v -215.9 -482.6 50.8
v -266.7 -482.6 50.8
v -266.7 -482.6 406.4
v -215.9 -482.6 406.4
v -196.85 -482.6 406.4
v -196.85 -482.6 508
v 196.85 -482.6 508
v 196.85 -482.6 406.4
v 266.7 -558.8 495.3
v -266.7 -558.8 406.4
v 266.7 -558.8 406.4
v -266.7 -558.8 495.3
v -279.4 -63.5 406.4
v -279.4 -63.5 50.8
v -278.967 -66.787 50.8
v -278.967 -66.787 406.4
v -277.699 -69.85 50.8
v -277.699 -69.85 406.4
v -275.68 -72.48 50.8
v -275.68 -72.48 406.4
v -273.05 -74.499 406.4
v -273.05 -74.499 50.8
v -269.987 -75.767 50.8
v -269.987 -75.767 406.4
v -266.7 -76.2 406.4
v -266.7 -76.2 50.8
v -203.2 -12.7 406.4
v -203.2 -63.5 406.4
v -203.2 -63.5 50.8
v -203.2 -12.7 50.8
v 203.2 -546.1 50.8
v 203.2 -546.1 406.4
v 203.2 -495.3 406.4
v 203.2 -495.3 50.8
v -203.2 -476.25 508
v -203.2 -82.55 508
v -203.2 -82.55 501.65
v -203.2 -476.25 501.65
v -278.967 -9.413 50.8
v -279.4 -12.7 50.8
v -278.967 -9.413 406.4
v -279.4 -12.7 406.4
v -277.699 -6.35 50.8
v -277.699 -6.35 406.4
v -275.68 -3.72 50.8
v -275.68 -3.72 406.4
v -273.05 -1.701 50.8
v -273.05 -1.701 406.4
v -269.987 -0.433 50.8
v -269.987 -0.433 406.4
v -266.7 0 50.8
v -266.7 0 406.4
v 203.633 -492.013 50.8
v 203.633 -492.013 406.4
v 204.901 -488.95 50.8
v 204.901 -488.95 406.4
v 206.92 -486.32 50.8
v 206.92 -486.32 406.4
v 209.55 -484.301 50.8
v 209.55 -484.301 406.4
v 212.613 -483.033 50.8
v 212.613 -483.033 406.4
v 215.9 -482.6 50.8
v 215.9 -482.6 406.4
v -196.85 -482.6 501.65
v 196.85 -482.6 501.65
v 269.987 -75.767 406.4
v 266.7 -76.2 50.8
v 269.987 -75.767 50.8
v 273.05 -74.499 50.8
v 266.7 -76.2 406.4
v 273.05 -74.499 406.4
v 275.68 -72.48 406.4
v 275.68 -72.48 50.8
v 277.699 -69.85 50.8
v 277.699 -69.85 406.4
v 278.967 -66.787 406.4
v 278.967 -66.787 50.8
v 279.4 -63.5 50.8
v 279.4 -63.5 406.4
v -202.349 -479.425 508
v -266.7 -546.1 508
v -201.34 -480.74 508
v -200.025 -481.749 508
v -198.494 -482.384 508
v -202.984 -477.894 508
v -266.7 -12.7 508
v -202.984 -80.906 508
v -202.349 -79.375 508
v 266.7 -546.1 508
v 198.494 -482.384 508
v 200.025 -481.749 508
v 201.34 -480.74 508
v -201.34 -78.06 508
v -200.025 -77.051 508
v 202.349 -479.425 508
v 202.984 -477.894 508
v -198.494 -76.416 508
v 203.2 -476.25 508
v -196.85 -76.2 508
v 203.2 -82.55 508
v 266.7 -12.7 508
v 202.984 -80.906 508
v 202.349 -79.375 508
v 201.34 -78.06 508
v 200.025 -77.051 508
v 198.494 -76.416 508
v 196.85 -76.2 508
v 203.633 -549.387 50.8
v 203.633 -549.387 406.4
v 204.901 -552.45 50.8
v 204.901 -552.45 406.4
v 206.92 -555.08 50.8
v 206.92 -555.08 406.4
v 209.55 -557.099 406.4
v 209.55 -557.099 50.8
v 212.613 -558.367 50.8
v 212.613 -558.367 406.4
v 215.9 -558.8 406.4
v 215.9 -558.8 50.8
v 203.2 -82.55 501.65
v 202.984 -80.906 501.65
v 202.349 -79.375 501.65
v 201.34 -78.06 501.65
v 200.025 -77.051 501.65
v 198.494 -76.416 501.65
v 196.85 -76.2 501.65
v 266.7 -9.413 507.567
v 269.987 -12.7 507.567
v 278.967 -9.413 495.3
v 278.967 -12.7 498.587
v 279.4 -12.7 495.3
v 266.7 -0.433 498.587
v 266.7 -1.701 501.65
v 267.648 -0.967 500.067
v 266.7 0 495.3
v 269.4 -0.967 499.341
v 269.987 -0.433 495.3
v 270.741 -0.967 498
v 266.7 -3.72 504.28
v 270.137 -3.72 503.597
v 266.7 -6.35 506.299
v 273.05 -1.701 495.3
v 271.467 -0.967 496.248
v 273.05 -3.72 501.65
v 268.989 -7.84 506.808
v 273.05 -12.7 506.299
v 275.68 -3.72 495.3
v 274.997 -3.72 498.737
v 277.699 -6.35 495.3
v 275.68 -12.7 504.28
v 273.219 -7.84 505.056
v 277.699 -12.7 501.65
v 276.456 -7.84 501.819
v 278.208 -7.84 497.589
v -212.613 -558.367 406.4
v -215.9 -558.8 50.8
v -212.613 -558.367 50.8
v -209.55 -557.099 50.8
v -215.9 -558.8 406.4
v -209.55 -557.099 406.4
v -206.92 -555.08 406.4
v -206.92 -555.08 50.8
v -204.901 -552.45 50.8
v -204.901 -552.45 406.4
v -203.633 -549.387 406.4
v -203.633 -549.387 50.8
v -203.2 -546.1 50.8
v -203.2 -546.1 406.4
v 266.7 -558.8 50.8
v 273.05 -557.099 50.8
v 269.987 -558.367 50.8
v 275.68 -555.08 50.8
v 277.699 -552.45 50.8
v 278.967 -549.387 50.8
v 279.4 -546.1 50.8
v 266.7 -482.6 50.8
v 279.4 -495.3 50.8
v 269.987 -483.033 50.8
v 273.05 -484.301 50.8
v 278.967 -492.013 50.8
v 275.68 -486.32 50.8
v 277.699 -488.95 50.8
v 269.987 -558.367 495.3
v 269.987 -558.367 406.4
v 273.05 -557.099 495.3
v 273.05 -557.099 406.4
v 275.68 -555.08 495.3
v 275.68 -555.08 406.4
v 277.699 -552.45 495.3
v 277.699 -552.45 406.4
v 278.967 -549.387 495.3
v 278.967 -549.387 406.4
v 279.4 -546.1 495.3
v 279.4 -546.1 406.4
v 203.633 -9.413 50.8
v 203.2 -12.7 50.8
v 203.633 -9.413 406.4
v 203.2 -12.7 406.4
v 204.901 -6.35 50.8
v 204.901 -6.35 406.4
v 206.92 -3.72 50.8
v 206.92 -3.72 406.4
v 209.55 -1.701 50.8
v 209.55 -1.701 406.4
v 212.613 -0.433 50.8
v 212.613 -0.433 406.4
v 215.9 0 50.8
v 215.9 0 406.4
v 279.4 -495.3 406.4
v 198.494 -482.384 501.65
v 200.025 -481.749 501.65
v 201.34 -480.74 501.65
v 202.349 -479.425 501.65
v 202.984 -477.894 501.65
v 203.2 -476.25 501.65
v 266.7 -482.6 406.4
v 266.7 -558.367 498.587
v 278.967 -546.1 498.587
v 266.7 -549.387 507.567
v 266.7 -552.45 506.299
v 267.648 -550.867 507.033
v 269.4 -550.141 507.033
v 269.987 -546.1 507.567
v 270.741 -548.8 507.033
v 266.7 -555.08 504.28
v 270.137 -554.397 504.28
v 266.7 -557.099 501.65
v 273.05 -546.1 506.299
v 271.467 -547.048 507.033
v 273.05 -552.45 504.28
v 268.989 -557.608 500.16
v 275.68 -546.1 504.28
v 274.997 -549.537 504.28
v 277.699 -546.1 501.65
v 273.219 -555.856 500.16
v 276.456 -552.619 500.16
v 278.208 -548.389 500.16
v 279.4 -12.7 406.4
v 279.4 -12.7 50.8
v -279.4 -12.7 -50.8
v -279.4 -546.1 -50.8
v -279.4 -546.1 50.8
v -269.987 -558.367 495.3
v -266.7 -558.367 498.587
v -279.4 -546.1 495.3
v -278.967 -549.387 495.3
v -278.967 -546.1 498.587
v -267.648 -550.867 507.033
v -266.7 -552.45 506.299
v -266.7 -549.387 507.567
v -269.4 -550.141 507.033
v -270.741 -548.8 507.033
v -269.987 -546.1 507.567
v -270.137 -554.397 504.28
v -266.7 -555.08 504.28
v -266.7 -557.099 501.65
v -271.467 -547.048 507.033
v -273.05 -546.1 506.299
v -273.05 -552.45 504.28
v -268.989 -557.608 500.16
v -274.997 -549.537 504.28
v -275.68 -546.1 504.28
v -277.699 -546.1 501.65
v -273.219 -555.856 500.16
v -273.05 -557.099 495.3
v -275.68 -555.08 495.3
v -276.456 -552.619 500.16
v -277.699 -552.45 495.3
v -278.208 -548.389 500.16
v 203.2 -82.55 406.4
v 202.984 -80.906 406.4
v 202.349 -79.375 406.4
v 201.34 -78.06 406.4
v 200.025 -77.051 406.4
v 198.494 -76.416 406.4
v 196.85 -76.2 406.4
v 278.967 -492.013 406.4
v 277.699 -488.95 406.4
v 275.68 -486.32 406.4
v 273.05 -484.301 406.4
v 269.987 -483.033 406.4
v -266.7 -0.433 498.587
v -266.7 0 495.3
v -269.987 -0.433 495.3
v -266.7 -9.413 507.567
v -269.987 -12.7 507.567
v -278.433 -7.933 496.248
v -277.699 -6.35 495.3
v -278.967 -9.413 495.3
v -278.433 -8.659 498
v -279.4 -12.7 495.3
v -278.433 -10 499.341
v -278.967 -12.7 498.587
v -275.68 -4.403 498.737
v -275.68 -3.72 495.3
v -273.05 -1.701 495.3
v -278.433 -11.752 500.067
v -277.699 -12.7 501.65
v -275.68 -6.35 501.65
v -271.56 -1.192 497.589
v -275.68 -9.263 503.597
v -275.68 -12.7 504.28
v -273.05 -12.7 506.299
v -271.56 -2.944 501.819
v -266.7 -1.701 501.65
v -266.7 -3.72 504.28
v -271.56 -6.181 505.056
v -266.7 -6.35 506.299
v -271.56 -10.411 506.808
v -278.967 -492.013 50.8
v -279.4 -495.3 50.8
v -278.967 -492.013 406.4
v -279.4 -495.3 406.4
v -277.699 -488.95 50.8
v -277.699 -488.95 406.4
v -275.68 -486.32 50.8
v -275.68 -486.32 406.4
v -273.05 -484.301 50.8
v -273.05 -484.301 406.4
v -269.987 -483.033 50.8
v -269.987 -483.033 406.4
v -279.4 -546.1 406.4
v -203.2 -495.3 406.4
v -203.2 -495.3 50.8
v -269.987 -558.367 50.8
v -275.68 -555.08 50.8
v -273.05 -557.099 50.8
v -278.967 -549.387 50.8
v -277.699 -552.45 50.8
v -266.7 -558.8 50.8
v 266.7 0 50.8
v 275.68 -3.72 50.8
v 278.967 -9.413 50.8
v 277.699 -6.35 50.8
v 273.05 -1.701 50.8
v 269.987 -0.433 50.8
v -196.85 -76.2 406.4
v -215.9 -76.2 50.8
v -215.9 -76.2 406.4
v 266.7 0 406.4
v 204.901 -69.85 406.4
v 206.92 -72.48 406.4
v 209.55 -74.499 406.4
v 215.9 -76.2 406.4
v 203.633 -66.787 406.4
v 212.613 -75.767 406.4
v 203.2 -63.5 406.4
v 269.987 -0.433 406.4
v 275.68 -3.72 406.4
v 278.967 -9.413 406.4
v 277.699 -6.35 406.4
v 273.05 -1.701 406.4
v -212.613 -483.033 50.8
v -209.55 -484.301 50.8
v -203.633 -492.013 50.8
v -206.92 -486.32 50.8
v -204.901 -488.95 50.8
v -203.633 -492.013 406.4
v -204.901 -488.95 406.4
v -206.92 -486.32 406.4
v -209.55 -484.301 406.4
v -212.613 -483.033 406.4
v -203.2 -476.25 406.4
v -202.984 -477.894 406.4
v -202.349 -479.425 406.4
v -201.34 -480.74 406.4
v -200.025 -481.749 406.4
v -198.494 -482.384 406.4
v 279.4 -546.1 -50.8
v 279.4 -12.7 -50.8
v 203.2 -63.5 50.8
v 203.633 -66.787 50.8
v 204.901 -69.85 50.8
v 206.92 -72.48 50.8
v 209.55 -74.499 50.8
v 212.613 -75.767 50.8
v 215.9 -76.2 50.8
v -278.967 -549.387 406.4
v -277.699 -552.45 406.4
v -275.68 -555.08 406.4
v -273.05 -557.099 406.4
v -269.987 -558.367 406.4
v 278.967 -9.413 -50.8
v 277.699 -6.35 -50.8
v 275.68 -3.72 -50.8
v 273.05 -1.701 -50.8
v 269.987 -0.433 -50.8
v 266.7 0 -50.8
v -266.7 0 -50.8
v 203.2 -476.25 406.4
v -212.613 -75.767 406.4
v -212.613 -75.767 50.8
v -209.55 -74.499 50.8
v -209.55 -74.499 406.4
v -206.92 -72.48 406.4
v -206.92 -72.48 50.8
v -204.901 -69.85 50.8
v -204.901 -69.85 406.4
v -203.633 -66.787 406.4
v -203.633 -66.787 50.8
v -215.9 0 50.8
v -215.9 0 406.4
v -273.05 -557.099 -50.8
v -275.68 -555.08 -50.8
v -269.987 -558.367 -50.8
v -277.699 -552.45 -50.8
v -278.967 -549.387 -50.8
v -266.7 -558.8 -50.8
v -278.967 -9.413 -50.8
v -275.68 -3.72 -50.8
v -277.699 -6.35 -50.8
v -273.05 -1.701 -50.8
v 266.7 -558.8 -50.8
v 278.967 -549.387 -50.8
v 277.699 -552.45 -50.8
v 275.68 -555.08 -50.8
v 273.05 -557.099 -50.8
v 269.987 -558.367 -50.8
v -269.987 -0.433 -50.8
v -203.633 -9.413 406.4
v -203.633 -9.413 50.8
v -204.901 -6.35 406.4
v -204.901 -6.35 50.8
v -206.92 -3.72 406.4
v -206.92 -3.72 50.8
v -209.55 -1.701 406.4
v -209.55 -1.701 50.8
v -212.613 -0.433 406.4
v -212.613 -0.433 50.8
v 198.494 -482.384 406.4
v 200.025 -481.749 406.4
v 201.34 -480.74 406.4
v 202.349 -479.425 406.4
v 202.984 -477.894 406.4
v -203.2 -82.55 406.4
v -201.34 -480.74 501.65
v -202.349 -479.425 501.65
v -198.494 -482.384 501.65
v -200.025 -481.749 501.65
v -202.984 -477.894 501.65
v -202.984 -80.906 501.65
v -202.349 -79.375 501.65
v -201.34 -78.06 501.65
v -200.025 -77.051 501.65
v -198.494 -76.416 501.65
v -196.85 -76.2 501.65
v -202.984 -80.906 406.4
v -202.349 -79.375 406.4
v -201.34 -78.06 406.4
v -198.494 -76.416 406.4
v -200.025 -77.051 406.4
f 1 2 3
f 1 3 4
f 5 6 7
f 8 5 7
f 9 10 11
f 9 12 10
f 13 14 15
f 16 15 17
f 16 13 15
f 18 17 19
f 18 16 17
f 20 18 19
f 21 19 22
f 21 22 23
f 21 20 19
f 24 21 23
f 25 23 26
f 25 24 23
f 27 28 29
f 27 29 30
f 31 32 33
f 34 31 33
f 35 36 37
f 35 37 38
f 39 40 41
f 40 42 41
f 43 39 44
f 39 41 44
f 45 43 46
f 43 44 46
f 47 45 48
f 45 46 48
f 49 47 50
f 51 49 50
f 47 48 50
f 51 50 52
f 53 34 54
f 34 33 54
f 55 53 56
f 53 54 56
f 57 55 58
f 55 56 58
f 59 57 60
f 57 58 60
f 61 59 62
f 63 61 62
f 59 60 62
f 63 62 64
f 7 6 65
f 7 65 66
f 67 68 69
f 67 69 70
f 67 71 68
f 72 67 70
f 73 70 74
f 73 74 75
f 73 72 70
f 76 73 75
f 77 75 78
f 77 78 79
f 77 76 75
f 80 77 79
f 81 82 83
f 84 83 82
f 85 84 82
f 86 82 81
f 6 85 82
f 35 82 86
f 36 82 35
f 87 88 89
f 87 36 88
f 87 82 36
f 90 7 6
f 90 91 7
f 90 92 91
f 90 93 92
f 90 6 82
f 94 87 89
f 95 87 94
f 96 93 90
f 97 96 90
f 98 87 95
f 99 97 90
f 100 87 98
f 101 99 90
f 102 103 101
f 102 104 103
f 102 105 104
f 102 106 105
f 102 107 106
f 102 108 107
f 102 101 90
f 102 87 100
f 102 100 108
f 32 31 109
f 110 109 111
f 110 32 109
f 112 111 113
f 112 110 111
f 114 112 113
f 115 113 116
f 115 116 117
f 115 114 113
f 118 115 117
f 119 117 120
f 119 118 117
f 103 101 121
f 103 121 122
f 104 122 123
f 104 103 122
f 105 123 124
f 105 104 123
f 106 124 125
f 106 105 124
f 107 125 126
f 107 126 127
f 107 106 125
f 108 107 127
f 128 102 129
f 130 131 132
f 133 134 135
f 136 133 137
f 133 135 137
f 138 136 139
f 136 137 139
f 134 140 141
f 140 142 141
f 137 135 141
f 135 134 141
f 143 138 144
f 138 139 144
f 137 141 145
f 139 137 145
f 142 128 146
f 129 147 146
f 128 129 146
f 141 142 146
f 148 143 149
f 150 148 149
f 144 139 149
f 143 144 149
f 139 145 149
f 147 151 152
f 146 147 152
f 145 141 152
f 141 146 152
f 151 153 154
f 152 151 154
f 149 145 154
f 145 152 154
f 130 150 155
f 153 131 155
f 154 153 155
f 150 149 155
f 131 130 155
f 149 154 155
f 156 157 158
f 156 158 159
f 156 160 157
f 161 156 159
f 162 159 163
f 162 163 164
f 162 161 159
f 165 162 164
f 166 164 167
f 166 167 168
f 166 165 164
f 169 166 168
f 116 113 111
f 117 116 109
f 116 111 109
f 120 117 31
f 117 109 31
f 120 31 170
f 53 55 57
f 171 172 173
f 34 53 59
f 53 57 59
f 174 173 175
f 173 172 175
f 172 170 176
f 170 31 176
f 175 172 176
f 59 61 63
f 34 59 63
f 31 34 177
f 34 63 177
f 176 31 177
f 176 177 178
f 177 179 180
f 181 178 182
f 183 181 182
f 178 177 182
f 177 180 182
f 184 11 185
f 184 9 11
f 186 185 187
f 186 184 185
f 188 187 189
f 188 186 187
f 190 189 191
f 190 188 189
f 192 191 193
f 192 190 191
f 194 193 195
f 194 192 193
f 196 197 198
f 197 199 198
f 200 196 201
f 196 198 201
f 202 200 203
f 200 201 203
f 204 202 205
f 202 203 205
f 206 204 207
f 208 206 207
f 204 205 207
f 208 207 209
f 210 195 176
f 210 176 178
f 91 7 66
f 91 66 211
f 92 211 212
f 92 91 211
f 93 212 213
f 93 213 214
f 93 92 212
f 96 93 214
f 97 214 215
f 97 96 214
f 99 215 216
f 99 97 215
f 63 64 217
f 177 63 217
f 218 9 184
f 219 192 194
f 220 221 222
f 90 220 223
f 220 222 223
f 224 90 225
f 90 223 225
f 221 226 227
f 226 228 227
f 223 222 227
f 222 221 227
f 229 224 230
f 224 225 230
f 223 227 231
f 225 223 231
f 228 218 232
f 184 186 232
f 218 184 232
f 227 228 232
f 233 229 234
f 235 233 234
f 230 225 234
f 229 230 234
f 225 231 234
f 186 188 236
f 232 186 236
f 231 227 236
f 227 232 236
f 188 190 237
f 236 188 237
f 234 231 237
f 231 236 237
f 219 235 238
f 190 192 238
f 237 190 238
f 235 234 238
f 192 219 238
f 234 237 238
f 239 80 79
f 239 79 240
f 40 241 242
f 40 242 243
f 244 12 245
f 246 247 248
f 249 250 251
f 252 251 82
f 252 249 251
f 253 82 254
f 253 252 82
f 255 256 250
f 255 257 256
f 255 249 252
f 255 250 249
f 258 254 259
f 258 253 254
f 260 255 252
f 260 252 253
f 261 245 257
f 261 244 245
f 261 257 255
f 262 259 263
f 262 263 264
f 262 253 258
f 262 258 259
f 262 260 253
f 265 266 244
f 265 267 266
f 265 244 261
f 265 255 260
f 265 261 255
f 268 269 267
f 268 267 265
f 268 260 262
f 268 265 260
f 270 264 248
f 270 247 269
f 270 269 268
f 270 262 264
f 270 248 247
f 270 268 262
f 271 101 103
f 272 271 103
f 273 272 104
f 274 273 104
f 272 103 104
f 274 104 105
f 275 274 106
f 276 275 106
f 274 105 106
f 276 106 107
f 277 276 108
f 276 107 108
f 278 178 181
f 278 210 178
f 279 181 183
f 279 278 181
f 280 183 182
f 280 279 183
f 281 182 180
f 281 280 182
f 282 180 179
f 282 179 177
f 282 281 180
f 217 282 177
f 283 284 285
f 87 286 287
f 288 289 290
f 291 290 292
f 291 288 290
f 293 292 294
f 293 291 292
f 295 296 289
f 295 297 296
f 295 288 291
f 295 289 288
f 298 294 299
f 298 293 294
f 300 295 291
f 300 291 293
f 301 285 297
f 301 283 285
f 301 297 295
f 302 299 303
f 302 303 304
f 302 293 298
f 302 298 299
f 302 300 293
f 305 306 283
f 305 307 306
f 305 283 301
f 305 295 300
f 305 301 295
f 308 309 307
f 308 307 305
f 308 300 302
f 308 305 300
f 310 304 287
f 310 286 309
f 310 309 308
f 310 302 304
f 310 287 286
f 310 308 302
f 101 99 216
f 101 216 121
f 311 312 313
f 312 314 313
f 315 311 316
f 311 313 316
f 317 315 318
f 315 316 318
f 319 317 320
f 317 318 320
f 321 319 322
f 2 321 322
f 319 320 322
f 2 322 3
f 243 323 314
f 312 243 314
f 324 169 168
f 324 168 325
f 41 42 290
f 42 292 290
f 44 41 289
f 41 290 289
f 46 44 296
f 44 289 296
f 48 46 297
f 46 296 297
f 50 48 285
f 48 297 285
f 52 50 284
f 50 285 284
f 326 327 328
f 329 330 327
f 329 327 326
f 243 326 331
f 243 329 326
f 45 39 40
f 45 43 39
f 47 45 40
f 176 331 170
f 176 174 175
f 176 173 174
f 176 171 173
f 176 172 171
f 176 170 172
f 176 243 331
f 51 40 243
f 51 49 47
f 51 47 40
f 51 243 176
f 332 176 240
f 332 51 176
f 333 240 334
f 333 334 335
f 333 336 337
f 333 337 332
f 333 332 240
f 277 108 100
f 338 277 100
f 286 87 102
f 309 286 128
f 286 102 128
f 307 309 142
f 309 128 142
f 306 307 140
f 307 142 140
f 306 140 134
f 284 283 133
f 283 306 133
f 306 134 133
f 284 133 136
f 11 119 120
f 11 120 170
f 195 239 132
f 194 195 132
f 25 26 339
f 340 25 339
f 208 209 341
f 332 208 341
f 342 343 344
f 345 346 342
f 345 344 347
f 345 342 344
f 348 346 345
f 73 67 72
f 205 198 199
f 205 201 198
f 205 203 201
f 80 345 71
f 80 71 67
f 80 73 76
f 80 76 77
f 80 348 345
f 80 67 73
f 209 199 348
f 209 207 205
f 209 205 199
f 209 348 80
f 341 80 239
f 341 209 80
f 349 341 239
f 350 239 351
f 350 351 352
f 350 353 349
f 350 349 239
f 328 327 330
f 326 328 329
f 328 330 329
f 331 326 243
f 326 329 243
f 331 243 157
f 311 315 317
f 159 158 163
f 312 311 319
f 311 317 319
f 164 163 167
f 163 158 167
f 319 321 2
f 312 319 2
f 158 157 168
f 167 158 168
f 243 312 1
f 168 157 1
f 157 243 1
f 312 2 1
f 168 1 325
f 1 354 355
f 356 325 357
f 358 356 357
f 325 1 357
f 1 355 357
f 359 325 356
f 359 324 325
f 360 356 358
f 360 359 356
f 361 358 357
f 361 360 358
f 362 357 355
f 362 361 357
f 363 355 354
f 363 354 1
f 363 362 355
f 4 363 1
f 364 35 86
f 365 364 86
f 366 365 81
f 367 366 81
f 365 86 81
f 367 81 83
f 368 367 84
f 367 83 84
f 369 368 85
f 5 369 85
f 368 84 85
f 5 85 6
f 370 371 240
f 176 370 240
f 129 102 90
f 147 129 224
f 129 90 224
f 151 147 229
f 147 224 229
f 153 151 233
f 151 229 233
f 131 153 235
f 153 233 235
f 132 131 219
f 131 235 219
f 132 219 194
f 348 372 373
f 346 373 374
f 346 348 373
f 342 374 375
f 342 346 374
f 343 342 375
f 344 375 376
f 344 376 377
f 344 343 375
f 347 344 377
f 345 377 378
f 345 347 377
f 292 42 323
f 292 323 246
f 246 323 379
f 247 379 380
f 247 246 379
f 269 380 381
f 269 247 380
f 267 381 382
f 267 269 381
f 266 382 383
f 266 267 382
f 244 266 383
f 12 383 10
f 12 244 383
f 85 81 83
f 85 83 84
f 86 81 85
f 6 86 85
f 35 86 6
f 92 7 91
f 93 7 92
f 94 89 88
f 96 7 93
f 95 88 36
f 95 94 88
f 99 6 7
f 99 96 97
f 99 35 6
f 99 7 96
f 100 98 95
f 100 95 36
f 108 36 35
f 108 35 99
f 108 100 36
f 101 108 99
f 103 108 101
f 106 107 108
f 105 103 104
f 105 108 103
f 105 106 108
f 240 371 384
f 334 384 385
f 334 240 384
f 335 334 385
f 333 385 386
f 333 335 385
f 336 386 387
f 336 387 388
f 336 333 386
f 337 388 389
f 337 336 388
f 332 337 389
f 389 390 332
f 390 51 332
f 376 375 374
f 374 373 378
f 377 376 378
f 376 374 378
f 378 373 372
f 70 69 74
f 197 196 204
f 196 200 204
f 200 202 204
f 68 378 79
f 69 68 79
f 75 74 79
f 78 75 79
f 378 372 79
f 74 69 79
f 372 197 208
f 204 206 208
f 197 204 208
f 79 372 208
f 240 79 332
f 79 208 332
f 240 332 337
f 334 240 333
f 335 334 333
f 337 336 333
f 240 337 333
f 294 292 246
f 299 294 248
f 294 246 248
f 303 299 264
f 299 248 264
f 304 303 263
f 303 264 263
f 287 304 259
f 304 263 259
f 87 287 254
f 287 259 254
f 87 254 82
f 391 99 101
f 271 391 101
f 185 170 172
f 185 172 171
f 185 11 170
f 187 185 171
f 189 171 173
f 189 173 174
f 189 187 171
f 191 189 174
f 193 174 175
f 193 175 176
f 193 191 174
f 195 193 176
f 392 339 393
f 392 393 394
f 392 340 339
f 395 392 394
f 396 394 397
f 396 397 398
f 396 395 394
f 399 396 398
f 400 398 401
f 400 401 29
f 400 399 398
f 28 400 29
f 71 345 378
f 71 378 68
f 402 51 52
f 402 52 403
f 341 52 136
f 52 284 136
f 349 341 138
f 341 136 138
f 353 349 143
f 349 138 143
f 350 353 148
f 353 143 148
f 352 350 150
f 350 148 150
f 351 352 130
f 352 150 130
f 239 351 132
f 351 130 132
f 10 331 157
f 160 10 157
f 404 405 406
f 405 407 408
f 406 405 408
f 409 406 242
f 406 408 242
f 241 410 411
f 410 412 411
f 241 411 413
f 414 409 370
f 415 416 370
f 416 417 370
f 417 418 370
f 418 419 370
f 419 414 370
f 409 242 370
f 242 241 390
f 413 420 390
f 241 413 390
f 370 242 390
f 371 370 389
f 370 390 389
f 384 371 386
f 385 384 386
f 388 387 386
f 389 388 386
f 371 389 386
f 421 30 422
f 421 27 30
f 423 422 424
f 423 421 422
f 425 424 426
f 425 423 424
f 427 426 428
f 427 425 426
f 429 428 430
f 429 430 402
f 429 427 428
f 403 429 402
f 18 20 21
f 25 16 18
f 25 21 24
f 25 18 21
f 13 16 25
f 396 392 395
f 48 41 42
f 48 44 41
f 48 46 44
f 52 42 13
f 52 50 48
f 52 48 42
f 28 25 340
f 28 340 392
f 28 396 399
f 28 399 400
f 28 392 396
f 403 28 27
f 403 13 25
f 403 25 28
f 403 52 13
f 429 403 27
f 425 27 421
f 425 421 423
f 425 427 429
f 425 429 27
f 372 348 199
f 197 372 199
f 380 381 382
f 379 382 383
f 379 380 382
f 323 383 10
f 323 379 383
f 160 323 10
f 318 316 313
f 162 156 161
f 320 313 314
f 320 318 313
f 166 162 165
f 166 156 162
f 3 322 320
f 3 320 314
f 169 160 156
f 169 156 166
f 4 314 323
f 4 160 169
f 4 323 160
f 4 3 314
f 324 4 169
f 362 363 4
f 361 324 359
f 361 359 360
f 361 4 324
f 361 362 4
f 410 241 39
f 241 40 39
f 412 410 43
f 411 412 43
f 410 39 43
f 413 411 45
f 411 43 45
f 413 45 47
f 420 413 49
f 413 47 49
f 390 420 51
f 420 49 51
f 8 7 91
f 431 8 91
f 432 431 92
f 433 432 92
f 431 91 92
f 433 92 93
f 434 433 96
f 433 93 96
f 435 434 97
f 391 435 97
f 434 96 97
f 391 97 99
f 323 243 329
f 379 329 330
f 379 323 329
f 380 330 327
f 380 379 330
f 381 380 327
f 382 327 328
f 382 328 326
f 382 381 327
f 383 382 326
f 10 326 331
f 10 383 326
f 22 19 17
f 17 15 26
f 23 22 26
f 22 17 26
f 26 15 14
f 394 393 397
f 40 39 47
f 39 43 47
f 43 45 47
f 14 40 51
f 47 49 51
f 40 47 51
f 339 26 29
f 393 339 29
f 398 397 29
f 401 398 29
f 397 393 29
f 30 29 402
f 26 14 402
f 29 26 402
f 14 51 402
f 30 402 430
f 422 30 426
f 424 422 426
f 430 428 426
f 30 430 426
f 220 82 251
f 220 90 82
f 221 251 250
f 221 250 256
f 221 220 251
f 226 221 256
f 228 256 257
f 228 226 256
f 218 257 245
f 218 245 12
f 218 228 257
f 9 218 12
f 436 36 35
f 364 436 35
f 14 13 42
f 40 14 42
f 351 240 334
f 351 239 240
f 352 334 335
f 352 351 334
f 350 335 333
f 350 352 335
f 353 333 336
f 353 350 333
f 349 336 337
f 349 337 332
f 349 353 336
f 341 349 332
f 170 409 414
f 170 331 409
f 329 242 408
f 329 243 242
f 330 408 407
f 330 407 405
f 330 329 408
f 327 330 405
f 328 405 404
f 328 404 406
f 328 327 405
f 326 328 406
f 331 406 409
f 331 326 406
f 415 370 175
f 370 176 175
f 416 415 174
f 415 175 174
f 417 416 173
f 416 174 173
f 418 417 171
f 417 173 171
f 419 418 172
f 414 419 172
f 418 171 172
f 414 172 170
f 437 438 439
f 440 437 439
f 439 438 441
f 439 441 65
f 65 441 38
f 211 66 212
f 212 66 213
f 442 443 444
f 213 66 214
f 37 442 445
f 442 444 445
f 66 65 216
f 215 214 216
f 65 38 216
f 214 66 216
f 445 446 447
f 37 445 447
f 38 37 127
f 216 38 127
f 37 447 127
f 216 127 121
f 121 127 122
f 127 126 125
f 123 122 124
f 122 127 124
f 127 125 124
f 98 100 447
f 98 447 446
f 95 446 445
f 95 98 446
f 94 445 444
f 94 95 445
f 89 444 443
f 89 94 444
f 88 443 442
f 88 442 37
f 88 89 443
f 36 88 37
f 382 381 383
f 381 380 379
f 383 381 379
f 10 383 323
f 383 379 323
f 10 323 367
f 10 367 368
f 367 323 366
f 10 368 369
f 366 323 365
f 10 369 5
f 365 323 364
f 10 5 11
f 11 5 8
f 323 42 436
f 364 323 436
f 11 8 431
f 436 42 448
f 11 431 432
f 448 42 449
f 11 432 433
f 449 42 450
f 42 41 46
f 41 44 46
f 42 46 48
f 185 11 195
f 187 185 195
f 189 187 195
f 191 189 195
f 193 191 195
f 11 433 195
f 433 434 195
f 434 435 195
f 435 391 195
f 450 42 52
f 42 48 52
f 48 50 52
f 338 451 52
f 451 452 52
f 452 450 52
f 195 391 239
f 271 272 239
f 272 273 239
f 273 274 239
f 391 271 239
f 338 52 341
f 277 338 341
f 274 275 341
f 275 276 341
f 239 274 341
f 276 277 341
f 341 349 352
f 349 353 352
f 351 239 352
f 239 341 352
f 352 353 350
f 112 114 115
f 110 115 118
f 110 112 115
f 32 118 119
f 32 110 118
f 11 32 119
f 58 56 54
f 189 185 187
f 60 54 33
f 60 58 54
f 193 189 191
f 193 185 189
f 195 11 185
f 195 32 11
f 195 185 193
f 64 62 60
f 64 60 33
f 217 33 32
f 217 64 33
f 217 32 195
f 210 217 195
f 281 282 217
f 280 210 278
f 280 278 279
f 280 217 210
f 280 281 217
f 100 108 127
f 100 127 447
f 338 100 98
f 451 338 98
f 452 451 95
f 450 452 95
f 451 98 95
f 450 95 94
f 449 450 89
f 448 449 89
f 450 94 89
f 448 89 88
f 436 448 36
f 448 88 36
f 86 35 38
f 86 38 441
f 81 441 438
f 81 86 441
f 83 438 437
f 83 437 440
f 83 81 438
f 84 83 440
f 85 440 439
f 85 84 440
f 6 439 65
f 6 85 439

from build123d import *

# Parameters (mm, degrees)
F0_W     = 558.8
F0_H     = 101.6
F1_DEPTH = 558.8
F2_W     = 76.2
F2_H     = 76.2
F3_DEPTH = 355.6
F6_DEPTH = 101.6
F7_R     = 12.7
F7_2_R   = 12.7
F7_3_R   = 12.7
F7_4_R   = 12.7
F7_5_R   = 12.7
F7_6_R   = 12.7
F9_DEPTH = 6.35


with BuildPart() as f1:
    # F0 (on Front) → F1 (new body)
    with BuildSketch(Plane.XZ):
        Rectangle(F0_W, F0_H)
    extrude(amount=F1_DEPTH)


with BuildPart() as f3:
    # F2 (on face) → F3 (new body)
    with BuildSketch(Plane.XY.offset(50.8)):
        with Locations((-241.3, -38.1)):
            Rectangle(F2_W, F2_H)
    extrude(amount=F3_DEPTH)

    # F7#6
    f7_6_edges = [f3.edges().sort_by_distance(p)[0] for p in [
        (-203.2, 0, 228.6),
        (-279.4, 0, 228.6),
        (-279.4, -76.2, 228.6),
        (-203.2, -76.2, 228.6),
    ]]
    fillet(f7_6_edges, radius=F7_6_R)


with BuildPart() as f3b:
    # F2 (on face) → F3, piece 2 (new body)
    with BuildSketch(Plane.XY.offset(50.8)):
        with Locations((241.3, -38.1)):
            Rectangle(F2_W, F2_H)
    extrude(amount=F3_DEPTH)

    # F7#5
    f7_5_edges = [f3b.edges().sort_by_distance(p)[0] for p in [
        (279.4, -76.2, 228.6),
        (279.4, 0, 228.6),
        (203.2, 0, 228.6),
        (203.2, -76.2, 228.6),
    ]]
    fillet(f7_5_edges, radius=F7_5_R)


with BuildPart() as f3c:
    # F2 (on face) → F3, piece 3 (new body)
    with BuildSketch(Plane.XY.offset(50.8)):
        with Locations((241.3, -520.7)):
            Rectangle(F2_W, F2_H)
    extrude(amount=F3_DEPTH)

    # F7
    f7_edges = [f3c.edges().sort_by_distance(p)[0] for p in [
        (279.4, -558.8, 228.6),
        (203.2, -558.8, 228.6),
        (279.4, -482.6, 228.6),
        (203.2, -482.6, 228.6),
    ]]
    fillet(f7_edges, radius=F7_R)


with BuildPart() as f3d:
    # F2 (on face) → F3, piece 4 (new body)
    with BuildSketch(Plane.XY.offset(50.8)):
        with Locations((-241.3, -520.7)):
            Rectangle(F2_W, F2_H)
    extrude(amount=F3_DEPTH)

    # F7#2
    f7_2_edges = [f3d.edges().sort_by_distance(p)[0] for p in [
        (-279.4, -558.8, 228.6),
        (-203.2, -558.8, 228.6),
        (-279.4, -482.6, 228.6),
        (-203.2, -482.6, 228.6),
    ]]
    fillet(f7_2_edges, radius=F7_2_R)


with BuildPart() as f4_1:
    # F4: copy of F1
    add(f1.part.moved(Location((0, 0, 457.2))))

    # F5 (on face) → F6 (cut)
    with BuildSketch(Plane.XY.offset(508)):
        with BuildLine():
            Line((-196.85, -482.6), (196.85, -482.6))
            ThreePointArc((196.85, -482.6), (201.3401280605, -480.7401280605), (203.2, -476.25))
            Line((203.2, -476.25), (203.2, -82.55))
            ThreePointArc((203.2, -82.55), (201.3401280605, -78.0598719395), (196.85, -76.2))
            Line((196.85, -76.2), (-196.85, -76.2))
            ThreePointArc((-196.85, -76.2), (-201.3401280605, -78.0598719395), (-203.2, -82.55))
            Line((-203.2, -82.55), (-203.2, -476.25))
            ThreePointArc((-203.2, -476.25), (-201.3401280605, -480.7401280605), (-196.85, -482.6))
        make_face()
    extrude(amount=-F6_DEPTH, mode=Mode.SUBTRACT)

    # F7#4
    f7_4_edges = [f4_1.edges().sort_by_distance(p)[0] for p in [
        (-279.4, -558.8, 457.2),
        (279.4, -558.8, 457.2),
        (0, -558.8, 508),
        (279.4, -279.4, 508),
        (0, 0, 508),
        (279.4, 0, 457.2),
        (-279.4, 0, 457.2),
        (-279.4, -279.4, 508),
    ]]
    fillet(f7_4_edges, radius=F7_4_R)


with BuildPart() as f1_1:
    add(f1.part)

    # F7#3
    f7_3_edges = [f1_1.edges().sort_by_distance(p)[0] for p in [
        (-279.4, -558.8, 0),
        (279.4, -558.8, 0),
        (279.4, 0, 0),
        (-279.4, 0, 0),
    ]]
    fillet(f7_3_edges, radius=F7_3_R)


with BuildPart() as f9:
    # F8 (on face) → F9 (new body)
    with BuildSketch(Plane.XY.offset(508)):
        with BuildLine():
            ThreePointArc((-203.2, -476.25), (-201.3401280605, -480.7401280605), (-196.85, -482.6))
            Line((-196.85, -482.6), (196.85, -482.6))
            ThreePointArc((196.85, -482.6), (201.3401280605, -480.7401280605), (203.2, -476.25))
            Line((203.2, -476.25), (203.2, -82.55))
            ThreePointArc((203.2, -82.55), (201.3401280605, -78.0598719395), (196.85, -76.2))
            Line((196.85, -76.2), (-196.85, -76.2))
            ThreePointArc((-196.85, -76.2), (-201.3401280605, -78.0598719395), (-203.2, -82.55))
            Line((-203.2, -82.55), (-203.2, -476.25))
        make_face()
    extrude(amount=-F9_DEPTH)


solid = Compound([f3.part, f3b.part, f3c.part, f3d.part, f4_1.part, f1_1.part, f9.part])
